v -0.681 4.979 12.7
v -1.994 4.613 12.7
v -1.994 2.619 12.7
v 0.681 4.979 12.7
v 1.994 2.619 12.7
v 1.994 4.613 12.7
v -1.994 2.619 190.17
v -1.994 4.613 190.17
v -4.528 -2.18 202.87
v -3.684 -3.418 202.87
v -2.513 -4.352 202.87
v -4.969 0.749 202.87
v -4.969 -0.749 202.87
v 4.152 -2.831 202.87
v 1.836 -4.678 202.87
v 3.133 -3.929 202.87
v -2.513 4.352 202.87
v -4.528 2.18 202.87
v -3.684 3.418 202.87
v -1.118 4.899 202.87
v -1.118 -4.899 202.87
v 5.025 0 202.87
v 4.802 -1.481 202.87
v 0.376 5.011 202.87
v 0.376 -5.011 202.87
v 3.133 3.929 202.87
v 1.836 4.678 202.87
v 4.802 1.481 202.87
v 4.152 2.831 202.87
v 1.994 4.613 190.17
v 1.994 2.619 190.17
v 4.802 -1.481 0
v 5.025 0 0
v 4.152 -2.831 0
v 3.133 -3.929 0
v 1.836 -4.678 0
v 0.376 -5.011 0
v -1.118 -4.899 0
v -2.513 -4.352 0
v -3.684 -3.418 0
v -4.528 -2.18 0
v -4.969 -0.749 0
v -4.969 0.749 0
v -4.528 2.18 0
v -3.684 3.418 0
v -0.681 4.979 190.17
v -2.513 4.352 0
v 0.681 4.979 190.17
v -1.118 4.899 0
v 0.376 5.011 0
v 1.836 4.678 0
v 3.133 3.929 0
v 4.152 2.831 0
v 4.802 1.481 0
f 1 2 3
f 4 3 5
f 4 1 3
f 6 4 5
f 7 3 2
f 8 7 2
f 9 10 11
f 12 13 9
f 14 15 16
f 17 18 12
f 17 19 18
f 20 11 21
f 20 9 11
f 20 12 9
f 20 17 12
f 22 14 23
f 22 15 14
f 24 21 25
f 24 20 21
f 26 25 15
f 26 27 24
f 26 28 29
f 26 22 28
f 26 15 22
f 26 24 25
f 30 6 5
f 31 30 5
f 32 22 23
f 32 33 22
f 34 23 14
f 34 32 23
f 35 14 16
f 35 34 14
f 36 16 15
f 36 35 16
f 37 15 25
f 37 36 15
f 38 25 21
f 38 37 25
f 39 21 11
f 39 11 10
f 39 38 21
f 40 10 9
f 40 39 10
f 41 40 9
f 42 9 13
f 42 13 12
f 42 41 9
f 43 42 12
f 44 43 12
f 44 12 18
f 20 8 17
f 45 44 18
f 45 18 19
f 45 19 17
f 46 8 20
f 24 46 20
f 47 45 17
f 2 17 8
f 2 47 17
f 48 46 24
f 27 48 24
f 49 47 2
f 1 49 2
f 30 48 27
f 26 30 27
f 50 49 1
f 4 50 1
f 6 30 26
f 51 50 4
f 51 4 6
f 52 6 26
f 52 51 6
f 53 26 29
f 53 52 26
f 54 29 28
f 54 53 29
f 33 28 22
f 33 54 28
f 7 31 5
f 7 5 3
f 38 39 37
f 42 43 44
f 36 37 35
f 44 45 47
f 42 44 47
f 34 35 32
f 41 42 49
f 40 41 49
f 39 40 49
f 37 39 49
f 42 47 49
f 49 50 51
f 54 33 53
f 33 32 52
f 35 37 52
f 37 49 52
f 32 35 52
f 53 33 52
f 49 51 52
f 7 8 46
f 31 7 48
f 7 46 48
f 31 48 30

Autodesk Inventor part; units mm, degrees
ref_plane "YZ Plane" through (0, 0, 0) normal (1, 0, 0) x (0, 1, 0)
ref_plane "XZ Plane" through (0, 0, 0) normal (0, 1, 0) x (-1, 0, 0)
ref_plane "XY Plane" through (0, 0, 0) normal (0, 0, 1) x (1, 0, 0)
sketch "Sketch1" plane through (0, 0, 0) normal (0, 0, 1) x (1, 0, 0)
  circle A0 centre (0, 0) radius 5.0254
  dimension "d0" = 10.0508
extrude "Extrusion1" add sketch "Sketch1" along normal blind 202.8698
sketch "Sketch2" plane through (0, 0, 202.8698) normal (0, 0, 1) x (1, 0, 0)
  circle A0 centre (0, 0) radius 5.0254
  circle A1 centre (0, 0) radius 5.0254 projected
  line L0 (-1.9939, 4.6129) -> (1.9939, 4.6129)
  line L1 (1.9939, 4.6129) -> (1.9939, 2.619)
  line L2 (1.9939, 2.619) -> (-1.9939, 2.619)
  line L3 (-1.9939, 2.619) -> (-1.9939, 4.6129)
  arc A2 (1.9939, 4.6129) -> (-1.9939, 4.6129) centre (0, 0) ccw
  dimension "d3" = 3.9878
  dimension "d4" = 1.9939
  dimension "d5" = 1.9939
extrude "Extrusion2" cut sketch "Sketch2" against normal blind 190.1698 contours L0 A0 | L1 L2 L3 L0
extrude "Extrusion3" add sketch "Sketch2" against normal blind 12.7 contours L0 A0 | L1 L2 L3 L0
properties part number "rod with key"
